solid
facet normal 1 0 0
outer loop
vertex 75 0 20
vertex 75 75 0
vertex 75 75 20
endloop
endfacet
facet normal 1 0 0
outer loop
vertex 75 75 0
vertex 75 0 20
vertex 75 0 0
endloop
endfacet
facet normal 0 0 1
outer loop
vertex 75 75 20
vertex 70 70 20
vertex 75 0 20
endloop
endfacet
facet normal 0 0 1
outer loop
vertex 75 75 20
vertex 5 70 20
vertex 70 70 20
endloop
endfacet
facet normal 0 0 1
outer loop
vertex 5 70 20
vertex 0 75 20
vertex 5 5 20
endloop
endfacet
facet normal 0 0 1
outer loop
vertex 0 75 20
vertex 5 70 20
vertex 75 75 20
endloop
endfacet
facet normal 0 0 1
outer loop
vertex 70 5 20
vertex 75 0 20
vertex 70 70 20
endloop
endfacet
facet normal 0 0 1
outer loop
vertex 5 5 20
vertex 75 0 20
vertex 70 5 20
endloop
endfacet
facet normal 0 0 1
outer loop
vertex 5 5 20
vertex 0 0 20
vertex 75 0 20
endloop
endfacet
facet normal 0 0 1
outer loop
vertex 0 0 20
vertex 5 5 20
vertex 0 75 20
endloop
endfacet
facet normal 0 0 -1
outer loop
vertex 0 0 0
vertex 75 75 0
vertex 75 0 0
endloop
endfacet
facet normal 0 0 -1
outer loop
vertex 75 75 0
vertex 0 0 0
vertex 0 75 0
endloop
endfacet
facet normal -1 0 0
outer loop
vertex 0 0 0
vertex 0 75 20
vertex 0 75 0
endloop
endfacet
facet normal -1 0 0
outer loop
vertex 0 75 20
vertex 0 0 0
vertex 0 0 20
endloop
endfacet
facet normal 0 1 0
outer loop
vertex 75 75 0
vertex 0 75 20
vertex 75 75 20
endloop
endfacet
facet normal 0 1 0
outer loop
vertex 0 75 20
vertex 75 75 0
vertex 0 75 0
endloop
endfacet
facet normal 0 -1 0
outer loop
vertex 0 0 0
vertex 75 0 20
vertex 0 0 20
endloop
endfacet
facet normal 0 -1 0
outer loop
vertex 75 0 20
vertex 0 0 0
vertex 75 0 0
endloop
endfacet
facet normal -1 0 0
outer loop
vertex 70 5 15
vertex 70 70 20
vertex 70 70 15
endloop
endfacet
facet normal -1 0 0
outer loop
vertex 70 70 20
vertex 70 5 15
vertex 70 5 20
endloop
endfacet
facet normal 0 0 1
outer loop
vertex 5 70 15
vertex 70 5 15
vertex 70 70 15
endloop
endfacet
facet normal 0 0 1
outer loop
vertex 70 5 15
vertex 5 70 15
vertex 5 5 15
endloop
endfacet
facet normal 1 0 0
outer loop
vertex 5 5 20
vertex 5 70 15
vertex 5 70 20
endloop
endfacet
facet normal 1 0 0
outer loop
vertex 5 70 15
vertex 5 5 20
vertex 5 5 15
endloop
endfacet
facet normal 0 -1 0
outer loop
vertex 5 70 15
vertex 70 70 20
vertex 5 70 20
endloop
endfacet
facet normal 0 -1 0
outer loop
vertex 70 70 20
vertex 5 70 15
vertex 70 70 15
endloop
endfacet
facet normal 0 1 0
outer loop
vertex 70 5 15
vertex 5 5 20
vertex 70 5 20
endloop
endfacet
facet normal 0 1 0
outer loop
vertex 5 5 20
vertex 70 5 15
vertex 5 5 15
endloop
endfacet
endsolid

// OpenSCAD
standHeight = 15;
standWidth = 65;
standWallThicknes = 5;
standSupportHeight = 5;

module standBase () {
    cube([
        standWidth + standWallThicknes*2,
        standWidth + standWallThicknes*2,
        standHeight + standSupportHeight
    ]);
}

module standBaseCutout () {
    translate([
        standWallThicknes, 
        standWallThicknes, 
        standHeight
    ])
    cube([
        standWidth,
        standWidth,
        standSupportHeight
    ]);
}

difference() {
    standBase();
    standBaseCutout();
}
